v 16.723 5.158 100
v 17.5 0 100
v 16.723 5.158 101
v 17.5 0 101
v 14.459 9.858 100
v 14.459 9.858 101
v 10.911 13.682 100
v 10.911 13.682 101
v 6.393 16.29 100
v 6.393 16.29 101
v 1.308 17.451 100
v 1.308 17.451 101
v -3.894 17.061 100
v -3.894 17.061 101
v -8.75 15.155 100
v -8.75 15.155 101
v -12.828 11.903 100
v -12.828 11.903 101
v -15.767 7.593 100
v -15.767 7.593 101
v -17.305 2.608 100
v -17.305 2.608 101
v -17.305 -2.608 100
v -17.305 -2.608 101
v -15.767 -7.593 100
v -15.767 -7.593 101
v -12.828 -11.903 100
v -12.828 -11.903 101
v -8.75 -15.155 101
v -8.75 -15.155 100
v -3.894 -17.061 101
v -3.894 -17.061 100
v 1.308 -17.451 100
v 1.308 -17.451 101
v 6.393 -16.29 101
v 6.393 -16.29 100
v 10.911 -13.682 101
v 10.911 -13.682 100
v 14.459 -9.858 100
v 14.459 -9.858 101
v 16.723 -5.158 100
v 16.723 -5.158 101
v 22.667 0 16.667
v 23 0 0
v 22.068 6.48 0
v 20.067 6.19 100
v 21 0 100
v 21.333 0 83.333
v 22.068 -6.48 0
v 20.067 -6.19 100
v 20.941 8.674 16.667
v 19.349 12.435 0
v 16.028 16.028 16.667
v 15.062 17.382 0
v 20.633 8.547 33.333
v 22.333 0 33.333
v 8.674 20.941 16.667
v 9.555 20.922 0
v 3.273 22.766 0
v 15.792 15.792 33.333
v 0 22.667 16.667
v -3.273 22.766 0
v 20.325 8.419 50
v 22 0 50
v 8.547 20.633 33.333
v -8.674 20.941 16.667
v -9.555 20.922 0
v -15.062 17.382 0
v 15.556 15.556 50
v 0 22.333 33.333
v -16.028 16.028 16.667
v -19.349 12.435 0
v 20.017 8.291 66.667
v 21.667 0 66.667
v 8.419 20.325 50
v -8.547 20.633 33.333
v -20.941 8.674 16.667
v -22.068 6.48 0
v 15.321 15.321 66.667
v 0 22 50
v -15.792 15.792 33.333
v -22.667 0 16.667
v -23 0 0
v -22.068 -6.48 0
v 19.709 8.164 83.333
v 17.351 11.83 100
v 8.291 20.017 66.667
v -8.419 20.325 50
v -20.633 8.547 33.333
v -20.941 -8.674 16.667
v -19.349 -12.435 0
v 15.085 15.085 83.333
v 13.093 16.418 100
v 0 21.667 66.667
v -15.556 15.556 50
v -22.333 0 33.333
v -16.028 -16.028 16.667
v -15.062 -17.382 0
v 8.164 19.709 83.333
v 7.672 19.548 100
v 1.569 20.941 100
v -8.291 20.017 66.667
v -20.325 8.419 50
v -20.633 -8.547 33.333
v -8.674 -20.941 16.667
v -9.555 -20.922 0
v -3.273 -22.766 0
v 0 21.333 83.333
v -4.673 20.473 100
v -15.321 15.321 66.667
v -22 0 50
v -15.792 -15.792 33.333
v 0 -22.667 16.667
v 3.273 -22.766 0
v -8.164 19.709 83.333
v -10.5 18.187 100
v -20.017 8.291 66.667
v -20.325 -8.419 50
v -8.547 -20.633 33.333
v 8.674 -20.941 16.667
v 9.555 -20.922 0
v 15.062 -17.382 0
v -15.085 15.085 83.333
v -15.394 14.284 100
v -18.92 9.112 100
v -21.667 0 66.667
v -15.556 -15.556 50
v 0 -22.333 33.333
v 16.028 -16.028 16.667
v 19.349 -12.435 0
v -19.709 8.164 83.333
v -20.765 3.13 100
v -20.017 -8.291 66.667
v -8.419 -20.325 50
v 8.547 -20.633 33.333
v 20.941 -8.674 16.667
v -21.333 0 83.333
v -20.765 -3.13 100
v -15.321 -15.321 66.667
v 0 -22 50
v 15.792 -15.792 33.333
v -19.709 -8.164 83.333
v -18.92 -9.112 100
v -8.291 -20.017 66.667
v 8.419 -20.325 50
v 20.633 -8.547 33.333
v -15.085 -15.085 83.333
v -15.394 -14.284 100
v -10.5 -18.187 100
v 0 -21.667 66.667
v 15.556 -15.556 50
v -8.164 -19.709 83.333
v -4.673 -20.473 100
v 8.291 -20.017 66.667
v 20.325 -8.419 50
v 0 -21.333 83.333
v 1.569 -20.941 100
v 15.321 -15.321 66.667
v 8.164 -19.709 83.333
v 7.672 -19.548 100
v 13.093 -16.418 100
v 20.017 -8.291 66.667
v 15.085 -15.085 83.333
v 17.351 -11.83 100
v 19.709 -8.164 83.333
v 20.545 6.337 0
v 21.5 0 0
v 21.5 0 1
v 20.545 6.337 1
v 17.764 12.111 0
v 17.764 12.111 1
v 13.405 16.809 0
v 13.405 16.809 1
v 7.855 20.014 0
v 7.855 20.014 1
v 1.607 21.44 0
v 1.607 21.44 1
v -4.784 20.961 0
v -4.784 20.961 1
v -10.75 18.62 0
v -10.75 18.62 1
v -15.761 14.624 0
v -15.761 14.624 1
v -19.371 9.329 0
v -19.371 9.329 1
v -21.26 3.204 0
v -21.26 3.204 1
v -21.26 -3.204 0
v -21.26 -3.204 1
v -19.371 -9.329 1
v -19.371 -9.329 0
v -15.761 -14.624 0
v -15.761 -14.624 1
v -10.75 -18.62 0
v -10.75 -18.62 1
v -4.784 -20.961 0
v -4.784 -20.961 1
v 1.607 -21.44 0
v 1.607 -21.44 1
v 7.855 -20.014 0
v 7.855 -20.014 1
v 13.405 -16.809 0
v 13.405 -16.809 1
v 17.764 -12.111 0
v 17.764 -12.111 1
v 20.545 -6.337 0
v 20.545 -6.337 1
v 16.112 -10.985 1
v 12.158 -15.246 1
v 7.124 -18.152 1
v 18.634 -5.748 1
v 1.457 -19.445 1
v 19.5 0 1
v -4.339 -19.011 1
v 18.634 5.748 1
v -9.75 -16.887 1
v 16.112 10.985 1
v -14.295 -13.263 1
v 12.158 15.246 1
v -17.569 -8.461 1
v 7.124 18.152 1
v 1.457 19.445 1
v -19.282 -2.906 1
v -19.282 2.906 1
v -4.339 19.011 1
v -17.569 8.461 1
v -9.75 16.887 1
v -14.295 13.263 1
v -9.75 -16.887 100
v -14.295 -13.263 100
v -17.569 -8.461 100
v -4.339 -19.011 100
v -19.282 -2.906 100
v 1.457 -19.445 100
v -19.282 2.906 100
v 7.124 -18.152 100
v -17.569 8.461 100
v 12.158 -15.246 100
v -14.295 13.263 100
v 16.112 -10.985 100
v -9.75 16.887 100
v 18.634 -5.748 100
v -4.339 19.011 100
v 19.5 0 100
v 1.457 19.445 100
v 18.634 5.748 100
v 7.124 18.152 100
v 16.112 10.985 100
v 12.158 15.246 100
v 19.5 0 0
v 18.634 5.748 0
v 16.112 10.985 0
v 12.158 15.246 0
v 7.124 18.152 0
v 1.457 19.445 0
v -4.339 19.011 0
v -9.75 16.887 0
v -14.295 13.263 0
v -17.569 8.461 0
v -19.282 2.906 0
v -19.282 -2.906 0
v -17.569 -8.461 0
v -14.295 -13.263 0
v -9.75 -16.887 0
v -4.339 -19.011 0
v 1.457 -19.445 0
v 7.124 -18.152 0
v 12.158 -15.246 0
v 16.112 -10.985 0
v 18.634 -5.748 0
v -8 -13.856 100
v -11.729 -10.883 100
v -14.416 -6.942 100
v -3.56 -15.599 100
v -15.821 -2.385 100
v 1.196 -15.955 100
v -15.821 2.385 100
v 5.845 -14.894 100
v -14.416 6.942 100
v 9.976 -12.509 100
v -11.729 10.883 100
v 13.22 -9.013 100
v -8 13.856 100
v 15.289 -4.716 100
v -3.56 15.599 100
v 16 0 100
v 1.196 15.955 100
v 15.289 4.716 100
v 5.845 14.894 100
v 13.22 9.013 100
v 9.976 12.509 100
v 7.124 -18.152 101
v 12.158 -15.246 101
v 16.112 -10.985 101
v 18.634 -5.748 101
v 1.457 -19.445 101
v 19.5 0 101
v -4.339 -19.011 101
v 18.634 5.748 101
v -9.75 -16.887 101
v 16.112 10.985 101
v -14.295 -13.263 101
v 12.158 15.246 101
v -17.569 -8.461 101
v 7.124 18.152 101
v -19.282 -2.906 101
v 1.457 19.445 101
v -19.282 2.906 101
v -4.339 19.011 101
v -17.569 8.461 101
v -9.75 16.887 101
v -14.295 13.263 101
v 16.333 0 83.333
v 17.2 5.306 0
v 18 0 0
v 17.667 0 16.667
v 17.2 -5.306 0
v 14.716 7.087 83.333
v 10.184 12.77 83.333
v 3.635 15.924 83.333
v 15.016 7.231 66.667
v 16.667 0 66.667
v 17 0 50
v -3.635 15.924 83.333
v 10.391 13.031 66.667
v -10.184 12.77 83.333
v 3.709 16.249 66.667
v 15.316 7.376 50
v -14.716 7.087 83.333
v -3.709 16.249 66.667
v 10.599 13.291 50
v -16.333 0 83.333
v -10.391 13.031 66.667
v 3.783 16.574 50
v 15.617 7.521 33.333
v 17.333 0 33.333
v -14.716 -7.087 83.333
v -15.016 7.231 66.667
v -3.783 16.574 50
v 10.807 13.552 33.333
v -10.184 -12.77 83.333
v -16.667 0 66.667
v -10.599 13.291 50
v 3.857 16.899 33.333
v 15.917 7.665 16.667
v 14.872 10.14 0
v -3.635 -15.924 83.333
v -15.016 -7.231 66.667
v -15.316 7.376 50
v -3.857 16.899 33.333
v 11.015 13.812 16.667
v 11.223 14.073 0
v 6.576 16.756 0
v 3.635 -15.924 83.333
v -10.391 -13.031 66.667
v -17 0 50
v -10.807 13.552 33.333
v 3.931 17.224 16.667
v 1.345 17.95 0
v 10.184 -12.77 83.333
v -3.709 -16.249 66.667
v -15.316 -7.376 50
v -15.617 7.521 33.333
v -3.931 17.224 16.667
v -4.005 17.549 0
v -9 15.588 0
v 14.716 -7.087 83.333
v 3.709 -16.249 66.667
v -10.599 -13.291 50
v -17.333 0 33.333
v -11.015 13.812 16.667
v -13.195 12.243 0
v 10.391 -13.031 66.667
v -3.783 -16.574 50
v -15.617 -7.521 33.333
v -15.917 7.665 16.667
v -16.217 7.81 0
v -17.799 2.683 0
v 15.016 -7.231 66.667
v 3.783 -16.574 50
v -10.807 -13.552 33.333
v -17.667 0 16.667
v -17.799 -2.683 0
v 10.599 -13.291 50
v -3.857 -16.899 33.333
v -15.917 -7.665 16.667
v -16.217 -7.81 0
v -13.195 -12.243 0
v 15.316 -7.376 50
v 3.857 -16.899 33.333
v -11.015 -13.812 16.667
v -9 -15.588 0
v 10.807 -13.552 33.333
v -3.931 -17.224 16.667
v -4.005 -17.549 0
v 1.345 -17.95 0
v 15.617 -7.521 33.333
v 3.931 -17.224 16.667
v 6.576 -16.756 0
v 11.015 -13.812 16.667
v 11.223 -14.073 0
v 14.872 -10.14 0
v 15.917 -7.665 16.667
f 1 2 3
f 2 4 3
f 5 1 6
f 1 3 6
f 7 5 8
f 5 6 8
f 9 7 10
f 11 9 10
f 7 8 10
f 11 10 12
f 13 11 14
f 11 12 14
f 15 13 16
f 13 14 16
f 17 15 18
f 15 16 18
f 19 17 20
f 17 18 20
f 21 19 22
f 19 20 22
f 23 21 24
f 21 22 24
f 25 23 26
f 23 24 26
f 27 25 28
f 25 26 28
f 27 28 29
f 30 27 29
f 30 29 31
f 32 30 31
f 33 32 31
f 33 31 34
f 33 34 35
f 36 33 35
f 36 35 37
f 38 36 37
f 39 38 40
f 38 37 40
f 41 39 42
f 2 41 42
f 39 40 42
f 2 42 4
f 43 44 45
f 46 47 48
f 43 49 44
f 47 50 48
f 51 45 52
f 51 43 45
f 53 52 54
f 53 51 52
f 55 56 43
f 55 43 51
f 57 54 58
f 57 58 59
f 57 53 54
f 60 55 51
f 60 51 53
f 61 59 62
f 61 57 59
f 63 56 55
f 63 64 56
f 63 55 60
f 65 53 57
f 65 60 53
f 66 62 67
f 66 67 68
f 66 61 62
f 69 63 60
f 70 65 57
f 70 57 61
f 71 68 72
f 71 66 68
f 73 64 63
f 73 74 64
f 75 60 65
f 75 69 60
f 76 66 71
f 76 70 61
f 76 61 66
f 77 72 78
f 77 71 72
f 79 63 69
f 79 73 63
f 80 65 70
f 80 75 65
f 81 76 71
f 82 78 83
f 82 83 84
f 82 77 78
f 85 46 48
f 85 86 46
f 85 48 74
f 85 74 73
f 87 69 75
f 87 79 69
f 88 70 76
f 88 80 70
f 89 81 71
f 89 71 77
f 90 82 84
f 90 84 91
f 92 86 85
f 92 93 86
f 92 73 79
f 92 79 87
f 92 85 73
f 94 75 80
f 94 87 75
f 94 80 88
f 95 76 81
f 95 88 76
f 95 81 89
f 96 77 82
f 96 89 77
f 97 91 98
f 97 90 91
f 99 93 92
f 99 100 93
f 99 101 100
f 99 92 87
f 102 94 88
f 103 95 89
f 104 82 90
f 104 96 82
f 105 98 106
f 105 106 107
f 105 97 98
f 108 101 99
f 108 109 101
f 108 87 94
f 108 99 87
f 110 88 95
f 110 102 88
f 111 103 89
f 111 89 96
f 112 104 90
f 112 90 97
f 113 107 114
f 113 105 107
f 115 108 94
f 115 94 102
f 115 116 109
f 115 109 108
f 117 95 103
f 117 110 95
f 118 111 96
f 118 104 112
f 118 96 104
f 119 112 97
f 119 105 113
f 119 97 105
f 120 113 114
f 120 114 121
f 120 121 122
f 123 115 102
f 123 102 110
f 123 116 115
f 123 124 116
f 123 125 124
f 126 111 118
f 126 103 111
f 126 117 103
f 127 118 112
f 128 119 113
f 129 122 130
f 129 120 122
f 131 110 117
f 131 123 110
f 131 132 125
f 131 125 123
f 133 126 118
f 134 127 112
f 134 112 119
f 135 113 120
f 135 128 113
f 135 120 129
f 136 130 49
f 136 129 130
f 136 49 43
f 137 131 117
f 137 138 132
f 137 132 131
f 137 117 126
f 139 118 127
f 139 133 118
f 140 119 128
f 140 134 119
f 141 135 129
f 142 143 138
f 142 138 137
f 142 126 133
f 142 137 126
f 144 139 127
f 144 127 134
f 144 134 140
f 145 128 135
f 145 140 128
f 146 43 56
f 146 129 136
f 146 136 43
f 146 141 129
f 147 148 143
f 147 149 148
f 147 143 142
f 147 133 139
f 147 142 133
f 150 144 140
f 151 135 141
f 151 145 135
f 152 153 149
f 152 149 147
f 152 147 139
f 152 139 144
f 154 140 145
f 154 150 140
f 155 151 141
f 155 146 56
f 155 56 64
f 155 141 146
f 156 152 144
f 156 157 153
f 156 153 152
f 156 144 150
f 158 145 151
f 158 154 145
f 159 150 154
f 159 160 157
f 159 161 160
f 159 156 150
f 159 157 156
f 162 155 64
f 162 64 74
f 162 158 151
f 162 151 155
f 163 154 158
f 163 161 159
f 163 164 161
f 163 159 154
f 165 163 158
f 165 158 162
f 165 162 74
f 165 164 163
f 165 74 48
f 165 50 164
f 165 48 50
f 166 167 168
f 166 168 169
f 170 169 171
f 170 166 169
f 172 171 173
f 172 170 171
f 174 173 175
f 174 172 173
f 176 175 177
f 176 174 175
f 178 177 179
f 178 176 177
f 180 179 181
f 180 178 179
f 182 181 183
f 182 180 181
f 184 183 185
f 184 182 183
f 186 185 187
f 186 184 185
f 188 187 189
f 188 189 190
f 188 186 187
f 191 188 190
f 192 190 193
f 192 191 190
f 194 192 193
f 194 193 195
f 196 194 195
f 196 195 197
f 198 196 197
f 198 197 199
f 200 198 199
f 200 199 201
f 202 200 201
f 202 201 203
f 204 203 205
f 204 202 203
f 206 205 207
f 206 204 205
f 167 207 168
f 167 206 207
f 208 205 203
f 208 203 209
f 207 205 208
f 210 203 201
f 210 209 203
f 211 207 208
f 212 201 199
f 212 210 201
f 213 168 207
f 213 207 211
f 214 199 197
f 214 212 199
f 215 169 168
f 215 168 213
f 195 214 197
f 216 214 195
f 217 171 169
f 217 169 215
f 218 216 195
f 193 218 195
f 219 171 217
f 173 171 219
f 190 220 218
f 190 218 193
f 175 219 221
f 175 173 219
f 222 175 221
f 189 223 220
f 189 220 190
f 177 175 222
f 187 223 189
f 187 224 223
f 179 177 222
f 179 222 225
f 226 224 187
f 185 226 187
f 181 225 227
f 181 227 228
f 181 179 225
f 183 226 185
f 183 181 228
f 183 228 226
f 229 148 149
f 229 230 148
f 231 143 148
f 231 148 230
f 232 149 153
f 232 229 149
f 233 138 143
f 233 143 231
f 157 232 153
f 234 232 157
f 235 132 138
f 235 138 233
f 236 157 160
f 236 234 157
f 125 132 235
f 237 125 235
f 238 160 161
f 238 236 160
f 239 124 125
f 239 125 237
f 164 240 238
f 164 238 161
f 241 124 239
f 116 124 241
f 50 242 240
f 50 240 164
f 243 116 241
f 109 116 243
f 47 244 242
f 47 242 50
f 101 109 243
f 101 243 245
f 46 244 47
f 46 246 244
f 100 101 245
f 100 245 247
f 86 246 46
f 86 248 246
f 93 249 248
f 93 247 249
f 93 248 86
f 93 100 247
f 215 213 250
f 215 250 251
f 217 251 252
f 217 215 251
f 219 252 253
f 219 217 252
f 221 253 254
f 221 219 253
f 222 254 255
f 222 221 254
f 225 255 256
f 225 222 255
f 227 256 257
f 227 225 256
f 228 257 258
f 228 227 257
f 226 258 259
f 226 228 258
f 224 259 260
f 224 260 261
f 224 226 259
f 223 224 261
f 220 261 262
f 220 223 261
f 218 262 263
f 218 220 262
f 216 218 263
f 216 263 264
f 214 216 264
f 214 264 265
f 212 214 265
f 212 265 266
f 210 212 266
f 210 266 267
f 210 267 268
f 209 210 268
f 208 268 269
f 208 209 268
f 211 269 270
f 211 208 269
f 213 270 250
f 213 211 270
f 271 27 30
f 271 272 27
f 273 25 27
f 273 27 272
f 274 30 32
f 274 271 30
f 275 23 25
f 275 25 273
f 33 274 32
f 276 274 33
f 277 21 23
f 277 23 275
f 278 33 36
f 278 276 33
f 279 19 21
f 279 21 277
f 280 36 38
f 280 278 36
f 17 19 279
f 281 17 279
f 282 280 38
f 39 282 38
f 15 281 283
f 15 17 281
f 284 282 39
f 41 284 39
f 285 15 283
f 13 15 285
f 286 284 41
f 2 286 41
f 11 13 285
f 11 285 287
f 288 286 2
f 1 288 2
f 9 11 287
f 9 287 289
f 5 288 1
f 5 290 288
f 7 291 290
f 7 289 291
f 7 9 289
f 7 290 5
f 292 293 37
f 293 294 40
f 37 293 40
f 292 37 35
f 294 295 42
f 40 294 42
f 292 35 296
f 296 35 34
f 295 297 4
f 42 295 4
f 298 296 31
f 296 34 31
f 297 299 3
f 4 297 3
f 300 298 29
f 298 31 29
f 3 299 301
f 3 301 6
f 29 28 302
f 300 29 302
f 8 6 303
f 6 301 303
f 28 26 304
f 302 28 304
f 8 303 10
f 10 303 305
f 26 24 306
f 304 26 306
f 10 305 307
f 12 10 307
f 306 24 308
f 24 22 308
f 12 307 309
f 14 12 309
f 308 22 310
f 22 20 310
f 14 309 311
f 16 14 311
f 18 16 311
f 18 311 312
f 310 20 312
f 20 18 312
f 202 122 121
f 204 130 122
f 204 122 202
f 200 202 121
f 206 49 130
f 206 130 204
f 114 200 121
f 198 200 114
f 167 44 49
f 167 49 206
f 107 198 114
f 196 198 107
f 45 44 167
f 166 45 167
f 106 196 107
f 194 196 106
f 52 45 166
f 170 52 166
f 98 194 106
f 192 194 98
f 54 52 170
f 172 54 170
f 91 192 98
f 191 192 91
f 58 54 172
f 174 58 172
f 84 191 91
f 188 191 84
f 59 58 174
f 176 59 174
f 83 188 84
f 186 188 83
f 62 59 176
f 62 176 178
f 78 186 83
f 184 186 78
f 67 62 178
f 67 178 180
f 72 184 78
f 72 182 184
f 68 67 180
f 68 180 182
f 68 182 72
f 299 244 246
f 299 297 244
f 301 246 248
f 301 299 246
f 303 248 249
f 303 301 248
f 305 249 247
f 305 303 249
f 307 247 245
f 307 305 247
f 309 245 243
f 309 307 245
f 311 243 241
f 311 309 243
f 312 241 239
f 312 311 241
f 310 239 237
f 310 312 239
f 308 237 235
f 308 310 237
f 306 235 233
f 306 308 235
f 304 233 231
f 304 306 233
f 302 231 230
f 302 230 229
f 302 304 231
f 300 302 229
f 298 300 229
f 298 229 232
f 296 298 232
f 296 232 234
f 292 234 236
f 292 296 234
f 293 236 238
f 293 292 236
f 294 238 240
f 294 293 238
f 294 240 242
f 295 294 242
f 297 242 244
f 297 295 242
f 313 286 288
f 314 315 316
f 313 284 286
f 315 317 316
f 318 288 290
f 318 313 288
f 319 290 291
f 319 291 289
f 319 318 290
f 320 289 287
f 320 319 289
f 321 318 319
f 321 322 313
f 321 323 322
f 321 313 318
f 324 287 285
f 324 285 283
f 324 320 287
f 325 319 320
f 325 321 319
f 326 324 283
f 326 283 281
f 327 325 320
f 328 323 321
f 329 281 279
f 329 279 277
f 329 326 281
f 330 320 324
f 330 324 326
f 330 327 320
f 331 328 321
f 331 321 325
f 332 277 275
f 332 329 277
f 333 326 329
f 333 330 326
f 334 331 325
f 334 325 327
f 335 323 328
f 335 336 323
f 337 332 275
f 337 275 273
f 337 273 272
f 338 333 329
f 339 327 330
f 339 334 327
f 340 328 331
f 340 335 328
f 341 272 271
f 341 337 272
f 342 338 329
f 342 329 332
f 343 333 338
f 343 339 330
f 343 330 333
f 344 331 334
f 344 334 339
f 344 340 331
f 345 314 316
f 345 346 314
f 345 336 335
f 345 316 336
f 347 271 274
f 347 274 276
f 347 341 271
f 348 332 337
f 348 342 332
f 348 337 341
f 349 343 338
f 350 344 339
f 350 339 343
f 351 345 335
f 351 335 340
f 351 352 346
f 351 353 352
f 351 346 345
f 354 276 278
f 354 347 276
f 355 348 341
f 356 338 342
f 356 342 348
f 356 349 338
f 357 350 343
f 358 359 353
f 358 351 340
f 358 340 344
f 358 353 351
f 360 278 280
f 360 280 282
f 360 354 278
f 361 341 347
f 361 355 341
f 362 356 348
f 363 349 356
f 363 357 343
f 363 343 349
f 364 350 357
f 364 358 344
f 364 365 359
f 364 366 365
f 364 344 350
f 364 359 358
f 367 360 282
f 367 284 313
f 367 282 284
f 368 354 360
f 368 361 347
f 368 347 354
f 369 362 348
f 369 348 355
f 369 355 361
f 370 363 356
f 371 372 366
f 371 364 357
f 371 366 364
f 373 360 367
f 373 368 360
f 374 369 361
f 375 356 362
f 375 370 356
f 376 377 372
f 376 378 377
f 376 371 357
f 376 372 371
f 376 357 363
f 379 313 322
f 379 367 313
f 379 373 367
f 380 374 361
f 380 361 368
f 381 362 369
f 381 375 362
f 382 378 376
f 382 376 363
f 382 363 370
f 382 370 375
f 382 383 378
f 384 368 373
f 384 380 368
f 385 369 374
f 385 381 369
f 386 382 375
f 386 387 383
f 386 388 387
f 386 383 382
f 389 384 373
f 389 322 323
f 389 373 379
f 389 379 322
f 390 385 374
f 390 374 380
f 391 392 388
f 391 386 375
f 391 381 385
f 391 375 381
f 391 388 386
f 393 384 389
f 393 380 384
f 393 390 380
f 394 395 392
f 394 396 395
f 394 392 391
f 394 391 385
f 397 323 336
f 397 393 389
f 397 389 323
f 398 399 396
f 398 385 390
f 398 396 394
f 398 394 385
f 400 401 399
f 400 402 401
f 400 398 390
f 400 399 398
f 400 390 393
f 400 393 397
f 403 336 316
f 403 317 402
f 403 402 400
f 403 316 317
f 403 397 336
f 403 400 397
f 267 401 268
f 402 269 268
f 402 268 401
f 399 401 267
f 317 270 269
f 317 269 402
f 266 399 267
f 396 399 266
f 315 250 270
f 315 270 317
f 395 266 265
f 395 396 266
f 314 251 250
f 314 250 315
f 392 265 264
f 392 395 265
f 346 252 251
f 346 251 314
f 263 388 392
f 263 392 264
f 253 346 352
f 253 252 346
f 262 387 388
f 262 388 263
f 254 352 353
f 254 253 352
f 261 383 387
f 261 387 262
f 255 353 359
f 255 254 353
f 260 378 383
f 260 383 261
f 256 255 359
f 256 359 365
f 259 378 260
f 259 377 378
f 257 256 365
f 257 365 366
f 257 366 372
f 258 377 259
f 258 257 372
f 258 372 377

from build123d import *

# Parameters (mm, degrees)
F0_W = 2
F0_H = 1


with BuildPart() as f1:
    # F0 (on Front) → F1 (revolve)
    with BuildSketch(Plane.XZ):
        Polygon((16, 100), (18, 0), (19.5, 0), (19.5, 1), (21.5, 1), (21.5, 0), (23, 0), (21, 100), (19.5, 100), (17.5, 100), align=None)
        with Locations((18.5, 100.5)):
            Rectangle(F0_W, F0_H)
    revolve(axis=Axis((0, 0, 83.813059), (0, 0, 1)))

    # F0 (on Front) → F2 (revolve, cut)
    with BuildSketch(Plane.XZ):
        with Locations((20.5, 0.5)):
            Rectangle(F0_W, F0_H)
    revolve(axis=Axis((0, 0, 83.813059), (0, 0, 1)), mode=Mode.SUBTRACT)


solid = f1.part
